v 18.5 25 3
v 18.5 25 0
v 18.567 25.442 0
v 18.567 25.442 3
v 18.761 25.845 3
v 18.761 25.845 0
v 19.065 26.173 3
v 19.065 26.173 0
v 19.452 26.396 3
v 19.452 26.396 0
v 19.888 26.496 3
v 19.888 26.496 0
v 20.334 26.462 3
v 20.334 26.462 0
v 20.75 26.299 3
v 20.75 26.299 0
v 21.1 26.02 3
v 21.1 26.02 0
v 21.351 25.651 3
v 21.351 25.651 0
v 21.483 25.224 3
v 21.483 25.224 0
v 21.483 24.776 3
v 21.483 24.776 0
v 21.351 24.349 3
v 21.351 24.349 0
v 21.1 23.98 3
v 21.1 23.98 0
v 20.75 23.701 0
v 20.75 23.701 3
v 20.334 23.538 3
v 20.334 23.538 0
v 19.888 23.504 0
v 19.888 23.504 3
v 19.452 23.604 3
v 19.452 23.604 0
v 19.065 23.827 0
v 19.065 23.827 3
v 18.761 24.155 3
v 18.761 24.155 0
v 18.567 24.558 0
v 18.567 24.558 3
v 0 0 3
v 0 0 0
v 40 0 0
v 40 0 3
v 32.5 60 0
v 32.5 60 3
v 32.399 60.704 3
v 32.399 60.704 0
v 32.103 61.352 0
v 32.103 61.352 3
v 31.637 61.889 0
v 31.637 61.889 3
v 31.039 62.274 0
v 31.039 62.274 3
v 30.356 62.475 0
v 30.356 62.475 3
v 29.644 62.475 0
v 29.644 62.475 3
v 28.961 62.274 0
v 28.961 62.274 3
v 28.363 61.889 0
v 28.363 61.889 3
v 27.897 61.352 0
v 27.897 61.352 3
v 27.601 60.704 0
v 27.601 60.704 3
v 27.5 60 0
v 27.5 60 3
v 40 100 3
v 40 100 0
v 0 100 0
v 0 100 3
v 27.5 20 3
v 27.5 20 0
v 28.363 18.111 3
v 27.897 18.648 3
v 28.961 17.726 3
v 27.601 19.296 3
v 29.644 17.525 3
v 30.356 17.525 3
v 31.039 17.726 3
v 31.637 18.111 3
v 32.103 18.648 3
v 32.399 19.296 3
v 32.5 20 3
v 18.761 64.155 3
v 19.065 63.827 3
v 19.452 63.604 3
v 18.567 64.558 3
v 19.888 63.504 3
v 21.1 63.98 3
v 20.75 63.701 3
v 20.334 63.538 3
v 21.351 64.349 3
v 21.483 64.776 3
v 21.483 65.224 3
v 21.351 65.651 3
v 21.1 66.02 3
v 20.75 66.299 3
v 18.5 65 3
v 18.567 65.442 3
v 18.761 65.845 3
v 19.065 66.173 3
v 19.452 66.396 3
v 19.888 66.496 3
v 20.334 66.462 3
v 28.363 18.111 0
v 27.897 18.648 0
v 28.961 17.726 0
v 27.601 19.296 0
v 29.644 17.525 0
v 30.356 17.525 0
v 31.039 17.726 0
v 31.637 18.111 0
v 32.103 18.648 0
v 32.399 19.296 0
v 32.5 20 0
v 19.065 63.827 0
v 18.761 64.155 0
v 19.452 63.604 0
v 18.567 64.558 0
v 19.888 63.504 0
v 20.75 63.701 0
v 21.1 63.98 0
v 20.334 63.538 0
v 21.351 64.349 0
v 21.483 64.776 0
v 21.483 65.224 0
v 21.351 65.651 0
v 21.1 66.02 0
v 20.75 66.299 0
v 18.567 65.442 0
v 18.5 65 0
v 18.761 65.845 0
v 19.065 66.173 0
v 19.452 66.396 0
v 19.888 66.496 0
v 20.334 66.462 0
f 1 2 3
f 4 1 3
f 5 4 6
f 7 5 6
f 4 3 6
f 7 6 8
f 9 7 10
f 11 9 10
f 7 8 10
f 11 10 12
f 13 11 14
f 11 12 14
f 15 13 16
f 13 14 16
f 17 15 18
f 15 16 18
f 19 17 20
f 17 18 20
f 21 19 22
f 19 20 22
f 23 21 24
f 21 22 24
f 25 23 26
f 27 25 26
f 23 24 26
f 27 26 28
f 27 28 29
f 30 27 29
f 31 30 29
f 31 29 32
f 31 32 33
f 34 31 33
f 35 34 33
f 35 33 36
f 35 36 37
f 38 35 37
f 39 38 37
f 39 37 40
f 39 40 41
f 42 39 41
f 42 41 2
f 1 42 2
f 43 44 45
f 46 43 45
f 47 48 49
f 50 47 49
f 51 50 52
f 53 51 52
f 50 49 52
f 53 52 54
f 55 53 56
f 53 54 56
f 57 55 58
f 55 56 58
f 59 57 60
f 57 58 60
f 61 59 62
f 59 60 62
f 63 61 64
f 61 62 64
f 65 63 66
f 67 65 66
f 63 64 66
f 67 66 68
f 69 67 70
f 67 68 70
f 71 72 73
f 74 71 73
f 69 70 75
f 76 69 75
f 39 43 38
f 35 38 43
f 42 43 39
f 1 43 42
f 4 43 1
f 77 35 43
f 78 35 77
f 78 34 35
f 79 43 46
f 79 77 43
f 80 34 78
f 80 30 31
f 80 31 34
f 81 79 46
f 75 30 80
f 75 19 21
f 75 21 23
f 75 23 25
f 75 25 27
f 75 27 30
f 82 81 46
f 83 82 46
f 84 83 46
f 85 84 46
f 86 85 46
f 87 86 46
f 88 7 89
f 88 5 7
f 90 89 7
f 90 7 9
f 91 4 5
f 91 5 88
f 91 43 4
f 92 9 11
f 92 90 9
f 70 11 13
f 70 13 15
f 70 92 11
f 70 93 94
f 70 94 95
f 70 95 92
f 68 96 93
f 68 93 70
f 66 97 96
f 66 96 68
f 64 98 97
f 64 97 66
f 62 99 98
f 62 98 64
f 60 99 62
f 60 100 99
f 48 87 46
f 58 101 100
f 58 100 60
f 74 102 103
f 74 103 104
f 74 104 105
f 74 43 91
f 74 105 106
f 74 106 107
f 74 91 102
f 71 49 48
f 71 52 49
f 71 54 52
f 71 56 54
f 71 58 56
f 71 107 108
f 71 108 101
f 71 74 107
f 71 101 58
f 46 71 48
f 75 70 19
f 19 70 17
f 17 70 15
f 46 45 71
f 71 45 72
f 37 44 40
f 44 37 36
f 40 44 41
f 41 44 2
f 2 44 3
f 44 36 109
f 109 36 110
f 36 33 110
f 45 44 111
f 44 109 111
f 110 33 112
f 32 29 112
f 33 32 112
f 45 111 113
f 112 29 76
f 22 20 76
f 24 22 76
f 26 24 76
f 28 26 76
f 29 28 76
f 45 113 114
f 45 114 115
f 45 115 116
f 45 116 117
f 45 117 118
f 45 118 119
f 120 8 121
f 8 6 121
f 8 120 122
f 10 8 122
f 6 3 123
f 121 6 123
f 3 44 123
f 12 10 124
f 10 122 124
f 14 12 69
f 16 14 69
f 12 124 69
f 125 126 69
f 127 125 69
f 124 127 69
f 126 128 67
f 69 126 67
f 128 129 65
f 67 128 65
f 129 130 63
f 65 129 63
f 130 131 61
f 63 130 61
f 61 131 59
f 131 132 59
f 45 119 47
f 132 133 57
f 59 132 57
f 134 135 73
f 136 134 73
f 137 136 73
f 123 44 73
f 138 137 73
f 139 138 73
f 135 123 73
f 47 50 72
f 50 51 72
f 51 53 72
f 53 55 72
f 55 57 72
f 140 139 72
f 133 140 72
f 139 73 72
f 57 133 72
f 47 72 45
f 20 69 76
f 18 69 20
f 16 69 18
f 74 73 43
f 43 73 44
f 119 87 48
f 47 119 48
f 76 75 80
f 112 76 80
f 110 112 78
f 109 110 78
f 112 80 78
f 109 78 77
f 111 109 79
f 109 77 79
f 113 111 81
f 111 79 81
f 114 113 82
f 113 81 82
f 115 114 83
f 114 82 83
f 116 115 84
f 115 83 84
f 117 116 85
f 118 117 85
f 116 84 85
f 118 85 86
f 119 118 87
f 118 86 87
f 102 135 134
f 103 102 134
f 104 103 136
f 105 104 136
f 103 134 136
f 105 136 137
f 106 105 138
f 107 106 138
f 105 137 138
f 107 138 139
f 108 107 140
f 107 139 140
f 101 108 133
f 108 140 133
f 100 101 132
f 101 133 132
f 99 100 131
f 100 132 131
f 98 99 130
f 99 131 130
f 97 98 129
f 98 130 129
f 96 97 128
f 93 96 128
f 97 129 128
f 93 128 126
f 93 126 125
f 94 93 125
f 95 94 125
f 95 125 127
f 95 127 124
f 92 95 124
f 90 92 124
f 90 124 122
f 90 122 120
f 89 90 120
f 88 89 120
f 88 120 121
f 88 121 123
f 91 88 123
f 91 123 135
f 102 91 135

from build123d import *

# Parameters (mm, degrees)
F1_DEPTH = 3
F3_D     = 3
F6_DEPTH = 25


with BuildPart() as f1:
    # F0 (on Top) → F1 (new body)
    with BuildSketch(Plane.XY):
        Polygon((0, 100), (0, 0), (5.765755, 0), (40, 0), (40, 100), align=None)
    extrude(amount=F1_DEPTH)

    # F3 (through all)
    with Locations(Plane.XY.offset(3)):
        with Locations((20, 65), (20, 25)):
            Hole(F3_D / 2)

    # F5 (on face) → F6 (cut)
    with BuildSketch(Plane.XY.offset(3)):
        with BuildLine():
            ThreePointArc((27.5, 20), (30, 17.5), (32.5, 20))
            Line((32.5, 20), (32.5, 60))
            ThreePointArc((32.5, 60), (30, 62.5), (27.5, 60))
            Line((27.5, 60), (27.5, 20))
        make_face()
    extrude(amount=-F6_DEPTH, mode=Mode.SUBTRACT)


solid = f1.part
